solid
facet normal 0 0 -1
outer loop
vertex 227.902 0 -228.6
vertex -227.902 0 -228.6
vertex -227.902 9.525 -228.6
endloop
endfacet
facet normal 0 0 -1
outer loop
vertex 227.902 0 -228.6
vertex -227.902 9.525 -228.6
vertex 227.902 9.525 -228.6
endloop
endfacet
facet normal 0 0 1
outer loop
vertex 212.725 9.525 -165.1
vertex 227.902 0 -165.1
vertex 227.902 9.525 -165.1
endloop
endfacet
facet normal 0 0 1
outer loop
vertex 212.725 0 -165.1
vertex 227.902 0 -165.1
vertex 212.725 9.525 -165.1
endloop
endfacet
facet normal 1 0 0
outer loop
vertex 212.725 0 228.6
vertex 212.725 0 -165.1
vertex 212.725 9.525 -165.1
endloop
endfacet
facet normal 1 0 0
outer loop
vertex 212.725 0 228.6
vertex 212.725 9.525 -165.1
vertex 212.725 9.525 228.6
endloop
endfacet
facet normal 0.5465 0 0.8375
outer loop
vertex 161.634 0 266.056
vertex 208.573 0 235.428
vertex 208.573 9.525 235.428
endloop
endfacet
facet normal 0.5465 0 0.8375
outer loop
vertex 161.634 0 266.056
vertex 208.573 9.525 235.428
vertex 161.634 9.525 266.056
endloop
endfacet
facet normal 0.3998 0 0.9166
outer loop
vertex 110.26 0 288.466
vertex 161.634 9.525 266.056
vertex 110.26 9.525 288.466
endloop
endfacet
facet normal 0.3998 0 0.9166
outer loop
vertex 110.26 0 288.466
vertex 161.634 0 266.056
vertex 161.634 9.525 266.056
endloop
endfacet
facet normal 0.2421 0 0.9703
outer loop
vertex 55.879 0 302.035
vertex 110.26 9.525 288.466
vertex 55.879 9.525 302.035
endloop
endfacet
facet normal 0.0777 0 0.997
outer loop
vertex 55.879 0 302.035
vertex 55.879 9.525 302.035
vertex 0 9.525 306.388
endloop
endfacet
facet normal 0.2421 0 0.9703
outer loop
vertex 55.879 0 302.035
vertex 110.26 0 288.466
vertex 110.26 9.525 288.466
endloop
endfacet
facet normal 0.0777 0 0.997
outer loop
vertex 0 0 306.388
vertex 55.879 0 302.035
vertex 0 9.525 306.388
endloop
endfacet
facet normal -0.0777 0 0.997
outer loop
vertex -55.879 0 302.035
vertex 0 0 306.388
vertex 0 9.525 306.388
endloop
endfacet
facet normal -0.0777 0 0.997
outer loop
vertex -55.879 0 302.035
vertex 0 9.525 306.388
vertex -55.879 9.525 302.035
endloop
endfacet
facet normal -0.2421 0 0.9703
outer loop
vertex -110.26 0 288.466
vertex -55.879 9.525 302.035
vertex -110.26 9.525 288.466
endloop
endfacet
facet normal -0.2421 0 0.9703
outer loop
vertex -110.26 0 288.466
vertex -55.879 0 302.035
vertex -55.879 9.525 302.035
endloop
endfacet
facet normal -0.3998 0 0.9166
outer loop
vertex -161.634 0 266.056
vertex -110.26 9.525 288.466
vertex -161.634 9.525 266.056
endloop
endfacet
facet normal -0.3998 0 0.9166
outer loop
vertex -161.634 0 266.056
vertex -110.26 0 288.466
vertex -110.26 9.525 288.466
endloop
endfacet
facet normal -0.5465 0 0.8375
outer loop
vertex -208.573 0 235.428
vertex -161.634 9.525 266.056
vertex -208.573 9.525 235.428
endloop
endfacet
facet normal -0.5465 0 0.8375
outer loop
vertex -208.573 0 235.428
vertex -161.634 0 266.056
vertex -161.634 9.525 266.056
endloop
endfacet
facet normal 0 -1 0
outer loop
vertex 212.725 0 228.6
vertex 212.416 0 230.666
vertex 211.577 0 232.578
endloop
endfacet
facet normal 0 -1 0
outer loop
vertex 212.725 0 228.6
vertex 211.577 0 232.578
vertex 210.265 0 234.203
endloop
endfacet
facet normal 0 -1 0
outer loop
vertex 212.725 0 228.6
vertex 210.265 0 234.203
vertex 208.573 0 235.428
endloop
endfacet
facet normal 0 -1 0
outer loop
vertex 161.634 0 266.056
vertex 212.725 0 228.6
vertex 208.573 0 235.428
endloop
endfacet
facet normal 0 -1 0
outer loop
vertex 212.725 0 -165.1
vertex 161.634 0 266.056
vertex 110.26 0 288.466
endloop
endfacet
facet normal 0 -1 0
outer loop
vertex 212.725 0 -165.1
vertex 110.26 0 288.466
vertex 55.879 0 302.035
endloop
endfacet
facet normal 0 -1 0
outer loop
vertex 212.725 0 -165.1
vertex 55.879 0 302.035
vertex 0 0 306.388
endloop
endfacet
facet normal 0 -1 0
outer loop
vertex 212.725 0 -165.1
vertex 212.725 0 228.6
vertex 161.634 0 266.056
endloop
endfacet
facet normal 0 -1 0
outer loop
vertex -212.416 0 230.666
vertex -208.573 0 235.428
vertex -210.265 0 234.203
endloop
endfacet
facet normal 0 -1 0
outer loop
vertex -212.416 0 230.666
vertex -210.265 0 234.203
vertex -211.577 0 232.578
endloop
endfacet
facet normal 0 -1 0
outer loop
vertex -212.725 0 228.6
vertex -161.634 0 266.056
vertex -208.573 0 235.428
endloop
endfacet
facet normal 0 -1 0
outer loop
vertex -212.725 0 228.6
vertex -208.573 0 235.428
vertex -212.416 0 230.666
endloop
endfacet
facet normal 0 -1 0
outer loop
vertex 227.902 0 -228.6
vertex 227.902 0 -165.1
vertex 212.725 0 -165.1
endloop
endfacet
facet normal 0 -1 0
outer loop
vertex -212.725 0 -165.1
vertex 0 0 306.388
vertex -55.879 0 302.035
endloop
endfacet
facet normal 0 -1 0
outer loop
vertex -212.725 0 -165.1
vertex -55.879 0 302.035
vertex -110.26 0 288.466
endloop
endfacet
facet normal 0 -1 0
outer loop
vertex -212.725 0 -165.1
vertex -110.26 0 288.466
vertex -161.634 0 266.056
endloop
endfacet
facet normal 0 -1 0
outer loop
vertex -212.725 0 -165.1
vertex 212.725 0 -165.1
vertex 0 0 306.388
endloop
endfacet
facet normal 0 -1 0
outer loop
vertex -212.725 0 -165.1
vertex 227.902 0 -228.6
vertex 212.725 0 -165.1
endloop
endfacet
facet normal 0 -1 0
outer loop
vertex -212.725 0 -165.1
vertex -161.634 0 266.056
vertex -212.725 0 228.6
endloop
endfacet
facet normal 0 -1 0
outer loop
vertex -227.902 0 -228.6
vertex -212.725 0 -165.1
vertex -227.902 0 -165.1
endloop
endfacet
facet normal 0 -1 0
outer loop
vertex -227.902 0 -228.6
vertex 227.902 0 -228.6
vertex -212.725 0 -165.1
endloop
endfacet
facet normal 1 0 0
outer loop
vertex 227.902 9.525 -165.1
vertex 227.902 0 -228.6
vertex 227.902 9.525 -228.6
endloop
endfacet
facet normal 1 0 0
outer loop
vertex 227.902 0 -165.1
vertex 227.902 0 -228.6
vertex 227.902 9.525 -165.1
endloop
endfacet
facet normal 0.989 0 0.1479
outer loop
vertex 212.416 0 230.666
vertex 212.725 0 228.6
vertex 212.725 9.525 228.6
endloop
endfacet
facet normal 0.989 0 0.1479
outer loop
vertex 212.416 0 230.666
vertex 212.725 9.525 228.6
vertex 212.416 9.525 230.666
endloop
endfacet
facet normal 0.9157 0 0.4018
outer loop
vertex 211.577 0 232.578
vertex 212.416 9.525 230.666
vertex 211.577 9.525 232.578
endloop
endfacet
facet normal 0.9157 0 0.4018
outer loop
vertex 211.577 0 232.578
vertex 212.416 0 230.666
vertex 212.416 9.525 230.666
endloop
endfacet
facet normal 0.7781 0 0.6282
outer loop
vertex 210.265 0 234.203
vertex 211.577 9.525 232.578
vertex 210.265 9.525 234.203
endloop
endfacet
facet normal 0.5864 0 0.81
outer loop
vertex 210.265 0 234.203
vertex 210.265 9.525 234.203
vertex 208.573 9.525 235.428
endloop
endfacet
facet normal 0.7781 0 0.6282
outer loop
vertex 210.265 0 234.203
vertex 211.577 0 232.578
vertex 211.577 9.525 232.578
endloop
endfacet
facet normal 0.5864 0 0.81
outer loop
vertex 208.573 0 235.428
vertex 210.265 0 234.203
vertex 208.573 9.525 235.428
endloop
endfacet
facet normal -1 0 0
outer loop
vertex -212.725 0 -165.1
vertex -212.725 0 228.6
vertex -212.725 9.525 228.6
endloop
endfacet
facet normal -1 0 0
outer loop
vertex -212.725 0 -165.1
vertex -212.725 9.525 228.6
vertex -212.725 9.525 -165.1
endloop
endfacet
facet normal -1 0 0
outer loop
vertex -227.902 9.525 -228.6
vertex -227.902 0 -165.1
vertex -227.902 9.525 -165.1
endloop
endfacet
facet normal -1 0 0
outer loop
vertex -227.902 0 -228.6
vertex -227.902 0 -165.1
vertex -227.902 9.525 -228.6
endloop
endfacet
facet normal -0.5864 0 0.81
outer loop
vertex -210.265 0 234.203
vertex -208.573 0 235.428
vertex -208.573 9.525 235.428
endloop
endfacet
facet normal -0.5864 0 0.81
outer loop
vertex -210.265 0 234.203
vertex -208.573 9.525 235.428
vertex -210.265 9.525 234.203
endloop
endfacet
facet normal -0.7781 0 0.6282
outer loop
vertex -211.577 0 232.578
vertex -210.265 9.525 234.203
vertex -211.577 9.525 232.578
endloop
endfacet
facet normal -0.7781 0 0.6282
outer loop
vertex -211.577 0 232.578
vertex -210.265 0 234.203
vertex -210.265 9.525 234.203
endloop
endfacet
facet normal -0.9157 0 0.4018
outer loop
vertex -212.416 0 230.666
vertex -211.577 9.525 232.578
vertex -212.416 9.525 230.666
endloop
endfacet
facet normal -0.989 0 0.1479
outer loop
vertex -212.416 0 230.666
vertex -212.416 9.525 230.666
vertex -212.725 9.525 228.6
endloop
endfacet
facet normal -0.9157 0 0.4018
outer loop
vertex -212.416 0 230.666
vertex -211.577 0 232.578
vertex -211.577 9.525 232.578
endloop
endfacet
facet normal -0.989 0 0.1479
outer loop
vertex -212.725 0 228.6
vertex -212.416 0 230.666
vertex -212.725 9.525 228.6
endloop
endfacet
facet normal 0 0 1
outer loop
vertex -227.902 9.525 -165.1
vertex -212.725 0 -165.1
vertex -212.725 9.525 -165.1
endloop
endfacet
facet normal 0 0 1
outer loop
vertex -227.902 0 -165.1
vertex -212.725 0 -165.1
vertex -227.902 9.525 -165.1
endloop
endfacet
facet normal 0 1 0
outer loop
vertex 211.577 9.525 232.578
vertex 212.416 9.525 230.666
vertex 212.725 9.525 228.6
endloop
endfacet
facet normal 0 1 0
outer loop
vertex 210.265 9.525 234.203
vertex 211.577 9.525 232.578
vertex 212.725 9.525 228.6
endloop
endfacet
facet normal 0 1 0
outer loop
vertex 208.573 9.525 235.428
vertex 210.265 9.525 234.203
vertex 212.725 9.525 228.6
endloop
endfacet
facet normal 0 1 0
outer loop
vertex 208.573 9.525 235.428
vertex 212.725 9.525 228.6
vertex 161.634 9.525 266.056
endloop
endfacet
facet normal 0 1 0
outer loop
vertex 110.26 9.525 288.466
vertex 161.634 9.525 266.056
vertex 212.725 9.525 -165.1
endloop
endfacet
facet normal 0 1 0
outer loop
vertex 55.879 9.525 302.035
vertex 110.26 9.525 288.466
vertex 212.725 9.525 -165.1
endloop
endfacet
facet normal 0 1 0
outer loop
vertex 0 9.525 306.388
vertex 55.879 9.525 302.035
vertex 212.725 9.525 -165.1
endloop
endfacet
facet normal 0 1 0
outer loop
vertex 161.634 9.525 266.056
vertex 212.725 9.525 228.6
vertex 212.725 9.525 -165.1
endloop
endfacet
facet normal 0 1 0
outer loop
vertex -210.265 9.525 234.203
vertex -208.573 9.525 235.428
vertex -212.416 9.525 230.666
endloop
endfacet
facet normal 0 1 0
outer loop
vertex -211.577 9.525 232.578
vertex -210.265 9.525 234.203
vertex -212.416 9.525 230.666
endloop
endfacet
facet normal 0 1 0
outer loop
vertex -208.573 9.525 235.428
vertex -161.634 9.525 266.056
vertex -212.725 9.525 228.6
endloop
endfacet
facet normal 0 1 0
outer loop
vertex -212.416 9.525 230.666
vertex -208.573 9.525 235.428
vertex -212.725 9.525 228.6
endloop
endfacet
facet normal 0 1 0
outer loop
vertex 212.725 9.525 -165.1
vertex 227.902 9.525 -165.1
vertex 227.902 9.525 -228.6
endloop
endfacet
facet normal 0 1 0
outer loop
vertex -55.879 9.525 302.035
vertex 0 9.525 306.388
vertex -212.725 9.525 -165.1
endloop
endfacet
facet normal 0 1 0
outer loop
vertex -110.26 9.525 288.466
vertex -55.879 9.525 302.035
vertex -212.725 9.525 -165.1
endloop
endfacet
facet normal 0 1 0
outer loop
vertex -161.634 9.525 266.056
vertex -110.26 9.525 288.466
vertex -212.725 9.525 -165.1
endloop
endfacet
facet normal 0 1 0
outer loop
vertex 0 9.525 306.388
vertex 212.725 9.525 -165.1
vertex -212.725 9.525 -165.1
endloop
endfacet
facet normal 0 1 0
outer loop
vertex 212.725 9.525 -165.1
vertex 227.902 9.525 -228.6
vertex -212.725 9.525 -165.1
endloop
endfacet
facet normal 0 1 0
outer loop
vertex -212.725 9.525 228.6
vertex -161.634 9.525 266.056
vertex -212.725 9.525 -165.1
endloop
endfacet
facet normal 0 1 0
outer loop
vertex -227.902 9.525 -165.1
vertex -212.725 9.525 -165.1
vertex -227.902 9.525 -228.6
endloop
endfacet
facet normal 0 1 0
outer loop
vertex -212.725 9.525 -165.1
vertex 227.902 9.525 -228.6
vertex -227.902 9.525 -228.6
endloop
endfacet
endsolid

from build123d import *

# Parameters (mm, degrees)
BOSS_EXTRUDE3_DEPTH = 9.525


with BuildPart() as part:
    # Sketch1 → Boss-Extrude3 (new body)
    with BuildSketch(Plane(origin=(0, 0, 0), x_dir=(1, 0, 0), z_dir=(0, 1, 0))):
        with BuildLine():
            Line((-212.725, -228.6), (-212.725, 165.1))
            Line((-212.725, 165.1), (-227.9015, 165.1))
            Line((-227.9015, 165.1), (-227.9015, 228.6))
            Line((-227.9015, 228.6), (-212.725, 228.6))
            Line((-212.725, 228.6), (212.725, 228.6))
            Line((212.725, 228.6), (227.9015, 228.6))
            Line((227.9015, 228.6), (227.9015, 165.1))
            Line((227.9015, 165.1), (212.725, 165.1))
            Line((212.725, 165.1), (212.725, -228.6))
            ThreePointArc((212.725, -228.6), (211.576723559, -232.577910433), (208.573053823, -235.427520636))
            ThreePointArc((208.573053823, -235.427520636), (110.260259044, -288.46613371), (0, -306.3875))
            ThreePointArc((0, -306.3875), (-110.260259044, -288.46613371), (-208.573053823, -235.427520636))
            ThreePointArc((-208.573053823, -235.427520636), (-211.576723559, -232.577910433), (-212.725, -228.6))
        make_face()
    extrude(amount=BOSS_EXTRUDE3_DEPTH)


solid = part.part
